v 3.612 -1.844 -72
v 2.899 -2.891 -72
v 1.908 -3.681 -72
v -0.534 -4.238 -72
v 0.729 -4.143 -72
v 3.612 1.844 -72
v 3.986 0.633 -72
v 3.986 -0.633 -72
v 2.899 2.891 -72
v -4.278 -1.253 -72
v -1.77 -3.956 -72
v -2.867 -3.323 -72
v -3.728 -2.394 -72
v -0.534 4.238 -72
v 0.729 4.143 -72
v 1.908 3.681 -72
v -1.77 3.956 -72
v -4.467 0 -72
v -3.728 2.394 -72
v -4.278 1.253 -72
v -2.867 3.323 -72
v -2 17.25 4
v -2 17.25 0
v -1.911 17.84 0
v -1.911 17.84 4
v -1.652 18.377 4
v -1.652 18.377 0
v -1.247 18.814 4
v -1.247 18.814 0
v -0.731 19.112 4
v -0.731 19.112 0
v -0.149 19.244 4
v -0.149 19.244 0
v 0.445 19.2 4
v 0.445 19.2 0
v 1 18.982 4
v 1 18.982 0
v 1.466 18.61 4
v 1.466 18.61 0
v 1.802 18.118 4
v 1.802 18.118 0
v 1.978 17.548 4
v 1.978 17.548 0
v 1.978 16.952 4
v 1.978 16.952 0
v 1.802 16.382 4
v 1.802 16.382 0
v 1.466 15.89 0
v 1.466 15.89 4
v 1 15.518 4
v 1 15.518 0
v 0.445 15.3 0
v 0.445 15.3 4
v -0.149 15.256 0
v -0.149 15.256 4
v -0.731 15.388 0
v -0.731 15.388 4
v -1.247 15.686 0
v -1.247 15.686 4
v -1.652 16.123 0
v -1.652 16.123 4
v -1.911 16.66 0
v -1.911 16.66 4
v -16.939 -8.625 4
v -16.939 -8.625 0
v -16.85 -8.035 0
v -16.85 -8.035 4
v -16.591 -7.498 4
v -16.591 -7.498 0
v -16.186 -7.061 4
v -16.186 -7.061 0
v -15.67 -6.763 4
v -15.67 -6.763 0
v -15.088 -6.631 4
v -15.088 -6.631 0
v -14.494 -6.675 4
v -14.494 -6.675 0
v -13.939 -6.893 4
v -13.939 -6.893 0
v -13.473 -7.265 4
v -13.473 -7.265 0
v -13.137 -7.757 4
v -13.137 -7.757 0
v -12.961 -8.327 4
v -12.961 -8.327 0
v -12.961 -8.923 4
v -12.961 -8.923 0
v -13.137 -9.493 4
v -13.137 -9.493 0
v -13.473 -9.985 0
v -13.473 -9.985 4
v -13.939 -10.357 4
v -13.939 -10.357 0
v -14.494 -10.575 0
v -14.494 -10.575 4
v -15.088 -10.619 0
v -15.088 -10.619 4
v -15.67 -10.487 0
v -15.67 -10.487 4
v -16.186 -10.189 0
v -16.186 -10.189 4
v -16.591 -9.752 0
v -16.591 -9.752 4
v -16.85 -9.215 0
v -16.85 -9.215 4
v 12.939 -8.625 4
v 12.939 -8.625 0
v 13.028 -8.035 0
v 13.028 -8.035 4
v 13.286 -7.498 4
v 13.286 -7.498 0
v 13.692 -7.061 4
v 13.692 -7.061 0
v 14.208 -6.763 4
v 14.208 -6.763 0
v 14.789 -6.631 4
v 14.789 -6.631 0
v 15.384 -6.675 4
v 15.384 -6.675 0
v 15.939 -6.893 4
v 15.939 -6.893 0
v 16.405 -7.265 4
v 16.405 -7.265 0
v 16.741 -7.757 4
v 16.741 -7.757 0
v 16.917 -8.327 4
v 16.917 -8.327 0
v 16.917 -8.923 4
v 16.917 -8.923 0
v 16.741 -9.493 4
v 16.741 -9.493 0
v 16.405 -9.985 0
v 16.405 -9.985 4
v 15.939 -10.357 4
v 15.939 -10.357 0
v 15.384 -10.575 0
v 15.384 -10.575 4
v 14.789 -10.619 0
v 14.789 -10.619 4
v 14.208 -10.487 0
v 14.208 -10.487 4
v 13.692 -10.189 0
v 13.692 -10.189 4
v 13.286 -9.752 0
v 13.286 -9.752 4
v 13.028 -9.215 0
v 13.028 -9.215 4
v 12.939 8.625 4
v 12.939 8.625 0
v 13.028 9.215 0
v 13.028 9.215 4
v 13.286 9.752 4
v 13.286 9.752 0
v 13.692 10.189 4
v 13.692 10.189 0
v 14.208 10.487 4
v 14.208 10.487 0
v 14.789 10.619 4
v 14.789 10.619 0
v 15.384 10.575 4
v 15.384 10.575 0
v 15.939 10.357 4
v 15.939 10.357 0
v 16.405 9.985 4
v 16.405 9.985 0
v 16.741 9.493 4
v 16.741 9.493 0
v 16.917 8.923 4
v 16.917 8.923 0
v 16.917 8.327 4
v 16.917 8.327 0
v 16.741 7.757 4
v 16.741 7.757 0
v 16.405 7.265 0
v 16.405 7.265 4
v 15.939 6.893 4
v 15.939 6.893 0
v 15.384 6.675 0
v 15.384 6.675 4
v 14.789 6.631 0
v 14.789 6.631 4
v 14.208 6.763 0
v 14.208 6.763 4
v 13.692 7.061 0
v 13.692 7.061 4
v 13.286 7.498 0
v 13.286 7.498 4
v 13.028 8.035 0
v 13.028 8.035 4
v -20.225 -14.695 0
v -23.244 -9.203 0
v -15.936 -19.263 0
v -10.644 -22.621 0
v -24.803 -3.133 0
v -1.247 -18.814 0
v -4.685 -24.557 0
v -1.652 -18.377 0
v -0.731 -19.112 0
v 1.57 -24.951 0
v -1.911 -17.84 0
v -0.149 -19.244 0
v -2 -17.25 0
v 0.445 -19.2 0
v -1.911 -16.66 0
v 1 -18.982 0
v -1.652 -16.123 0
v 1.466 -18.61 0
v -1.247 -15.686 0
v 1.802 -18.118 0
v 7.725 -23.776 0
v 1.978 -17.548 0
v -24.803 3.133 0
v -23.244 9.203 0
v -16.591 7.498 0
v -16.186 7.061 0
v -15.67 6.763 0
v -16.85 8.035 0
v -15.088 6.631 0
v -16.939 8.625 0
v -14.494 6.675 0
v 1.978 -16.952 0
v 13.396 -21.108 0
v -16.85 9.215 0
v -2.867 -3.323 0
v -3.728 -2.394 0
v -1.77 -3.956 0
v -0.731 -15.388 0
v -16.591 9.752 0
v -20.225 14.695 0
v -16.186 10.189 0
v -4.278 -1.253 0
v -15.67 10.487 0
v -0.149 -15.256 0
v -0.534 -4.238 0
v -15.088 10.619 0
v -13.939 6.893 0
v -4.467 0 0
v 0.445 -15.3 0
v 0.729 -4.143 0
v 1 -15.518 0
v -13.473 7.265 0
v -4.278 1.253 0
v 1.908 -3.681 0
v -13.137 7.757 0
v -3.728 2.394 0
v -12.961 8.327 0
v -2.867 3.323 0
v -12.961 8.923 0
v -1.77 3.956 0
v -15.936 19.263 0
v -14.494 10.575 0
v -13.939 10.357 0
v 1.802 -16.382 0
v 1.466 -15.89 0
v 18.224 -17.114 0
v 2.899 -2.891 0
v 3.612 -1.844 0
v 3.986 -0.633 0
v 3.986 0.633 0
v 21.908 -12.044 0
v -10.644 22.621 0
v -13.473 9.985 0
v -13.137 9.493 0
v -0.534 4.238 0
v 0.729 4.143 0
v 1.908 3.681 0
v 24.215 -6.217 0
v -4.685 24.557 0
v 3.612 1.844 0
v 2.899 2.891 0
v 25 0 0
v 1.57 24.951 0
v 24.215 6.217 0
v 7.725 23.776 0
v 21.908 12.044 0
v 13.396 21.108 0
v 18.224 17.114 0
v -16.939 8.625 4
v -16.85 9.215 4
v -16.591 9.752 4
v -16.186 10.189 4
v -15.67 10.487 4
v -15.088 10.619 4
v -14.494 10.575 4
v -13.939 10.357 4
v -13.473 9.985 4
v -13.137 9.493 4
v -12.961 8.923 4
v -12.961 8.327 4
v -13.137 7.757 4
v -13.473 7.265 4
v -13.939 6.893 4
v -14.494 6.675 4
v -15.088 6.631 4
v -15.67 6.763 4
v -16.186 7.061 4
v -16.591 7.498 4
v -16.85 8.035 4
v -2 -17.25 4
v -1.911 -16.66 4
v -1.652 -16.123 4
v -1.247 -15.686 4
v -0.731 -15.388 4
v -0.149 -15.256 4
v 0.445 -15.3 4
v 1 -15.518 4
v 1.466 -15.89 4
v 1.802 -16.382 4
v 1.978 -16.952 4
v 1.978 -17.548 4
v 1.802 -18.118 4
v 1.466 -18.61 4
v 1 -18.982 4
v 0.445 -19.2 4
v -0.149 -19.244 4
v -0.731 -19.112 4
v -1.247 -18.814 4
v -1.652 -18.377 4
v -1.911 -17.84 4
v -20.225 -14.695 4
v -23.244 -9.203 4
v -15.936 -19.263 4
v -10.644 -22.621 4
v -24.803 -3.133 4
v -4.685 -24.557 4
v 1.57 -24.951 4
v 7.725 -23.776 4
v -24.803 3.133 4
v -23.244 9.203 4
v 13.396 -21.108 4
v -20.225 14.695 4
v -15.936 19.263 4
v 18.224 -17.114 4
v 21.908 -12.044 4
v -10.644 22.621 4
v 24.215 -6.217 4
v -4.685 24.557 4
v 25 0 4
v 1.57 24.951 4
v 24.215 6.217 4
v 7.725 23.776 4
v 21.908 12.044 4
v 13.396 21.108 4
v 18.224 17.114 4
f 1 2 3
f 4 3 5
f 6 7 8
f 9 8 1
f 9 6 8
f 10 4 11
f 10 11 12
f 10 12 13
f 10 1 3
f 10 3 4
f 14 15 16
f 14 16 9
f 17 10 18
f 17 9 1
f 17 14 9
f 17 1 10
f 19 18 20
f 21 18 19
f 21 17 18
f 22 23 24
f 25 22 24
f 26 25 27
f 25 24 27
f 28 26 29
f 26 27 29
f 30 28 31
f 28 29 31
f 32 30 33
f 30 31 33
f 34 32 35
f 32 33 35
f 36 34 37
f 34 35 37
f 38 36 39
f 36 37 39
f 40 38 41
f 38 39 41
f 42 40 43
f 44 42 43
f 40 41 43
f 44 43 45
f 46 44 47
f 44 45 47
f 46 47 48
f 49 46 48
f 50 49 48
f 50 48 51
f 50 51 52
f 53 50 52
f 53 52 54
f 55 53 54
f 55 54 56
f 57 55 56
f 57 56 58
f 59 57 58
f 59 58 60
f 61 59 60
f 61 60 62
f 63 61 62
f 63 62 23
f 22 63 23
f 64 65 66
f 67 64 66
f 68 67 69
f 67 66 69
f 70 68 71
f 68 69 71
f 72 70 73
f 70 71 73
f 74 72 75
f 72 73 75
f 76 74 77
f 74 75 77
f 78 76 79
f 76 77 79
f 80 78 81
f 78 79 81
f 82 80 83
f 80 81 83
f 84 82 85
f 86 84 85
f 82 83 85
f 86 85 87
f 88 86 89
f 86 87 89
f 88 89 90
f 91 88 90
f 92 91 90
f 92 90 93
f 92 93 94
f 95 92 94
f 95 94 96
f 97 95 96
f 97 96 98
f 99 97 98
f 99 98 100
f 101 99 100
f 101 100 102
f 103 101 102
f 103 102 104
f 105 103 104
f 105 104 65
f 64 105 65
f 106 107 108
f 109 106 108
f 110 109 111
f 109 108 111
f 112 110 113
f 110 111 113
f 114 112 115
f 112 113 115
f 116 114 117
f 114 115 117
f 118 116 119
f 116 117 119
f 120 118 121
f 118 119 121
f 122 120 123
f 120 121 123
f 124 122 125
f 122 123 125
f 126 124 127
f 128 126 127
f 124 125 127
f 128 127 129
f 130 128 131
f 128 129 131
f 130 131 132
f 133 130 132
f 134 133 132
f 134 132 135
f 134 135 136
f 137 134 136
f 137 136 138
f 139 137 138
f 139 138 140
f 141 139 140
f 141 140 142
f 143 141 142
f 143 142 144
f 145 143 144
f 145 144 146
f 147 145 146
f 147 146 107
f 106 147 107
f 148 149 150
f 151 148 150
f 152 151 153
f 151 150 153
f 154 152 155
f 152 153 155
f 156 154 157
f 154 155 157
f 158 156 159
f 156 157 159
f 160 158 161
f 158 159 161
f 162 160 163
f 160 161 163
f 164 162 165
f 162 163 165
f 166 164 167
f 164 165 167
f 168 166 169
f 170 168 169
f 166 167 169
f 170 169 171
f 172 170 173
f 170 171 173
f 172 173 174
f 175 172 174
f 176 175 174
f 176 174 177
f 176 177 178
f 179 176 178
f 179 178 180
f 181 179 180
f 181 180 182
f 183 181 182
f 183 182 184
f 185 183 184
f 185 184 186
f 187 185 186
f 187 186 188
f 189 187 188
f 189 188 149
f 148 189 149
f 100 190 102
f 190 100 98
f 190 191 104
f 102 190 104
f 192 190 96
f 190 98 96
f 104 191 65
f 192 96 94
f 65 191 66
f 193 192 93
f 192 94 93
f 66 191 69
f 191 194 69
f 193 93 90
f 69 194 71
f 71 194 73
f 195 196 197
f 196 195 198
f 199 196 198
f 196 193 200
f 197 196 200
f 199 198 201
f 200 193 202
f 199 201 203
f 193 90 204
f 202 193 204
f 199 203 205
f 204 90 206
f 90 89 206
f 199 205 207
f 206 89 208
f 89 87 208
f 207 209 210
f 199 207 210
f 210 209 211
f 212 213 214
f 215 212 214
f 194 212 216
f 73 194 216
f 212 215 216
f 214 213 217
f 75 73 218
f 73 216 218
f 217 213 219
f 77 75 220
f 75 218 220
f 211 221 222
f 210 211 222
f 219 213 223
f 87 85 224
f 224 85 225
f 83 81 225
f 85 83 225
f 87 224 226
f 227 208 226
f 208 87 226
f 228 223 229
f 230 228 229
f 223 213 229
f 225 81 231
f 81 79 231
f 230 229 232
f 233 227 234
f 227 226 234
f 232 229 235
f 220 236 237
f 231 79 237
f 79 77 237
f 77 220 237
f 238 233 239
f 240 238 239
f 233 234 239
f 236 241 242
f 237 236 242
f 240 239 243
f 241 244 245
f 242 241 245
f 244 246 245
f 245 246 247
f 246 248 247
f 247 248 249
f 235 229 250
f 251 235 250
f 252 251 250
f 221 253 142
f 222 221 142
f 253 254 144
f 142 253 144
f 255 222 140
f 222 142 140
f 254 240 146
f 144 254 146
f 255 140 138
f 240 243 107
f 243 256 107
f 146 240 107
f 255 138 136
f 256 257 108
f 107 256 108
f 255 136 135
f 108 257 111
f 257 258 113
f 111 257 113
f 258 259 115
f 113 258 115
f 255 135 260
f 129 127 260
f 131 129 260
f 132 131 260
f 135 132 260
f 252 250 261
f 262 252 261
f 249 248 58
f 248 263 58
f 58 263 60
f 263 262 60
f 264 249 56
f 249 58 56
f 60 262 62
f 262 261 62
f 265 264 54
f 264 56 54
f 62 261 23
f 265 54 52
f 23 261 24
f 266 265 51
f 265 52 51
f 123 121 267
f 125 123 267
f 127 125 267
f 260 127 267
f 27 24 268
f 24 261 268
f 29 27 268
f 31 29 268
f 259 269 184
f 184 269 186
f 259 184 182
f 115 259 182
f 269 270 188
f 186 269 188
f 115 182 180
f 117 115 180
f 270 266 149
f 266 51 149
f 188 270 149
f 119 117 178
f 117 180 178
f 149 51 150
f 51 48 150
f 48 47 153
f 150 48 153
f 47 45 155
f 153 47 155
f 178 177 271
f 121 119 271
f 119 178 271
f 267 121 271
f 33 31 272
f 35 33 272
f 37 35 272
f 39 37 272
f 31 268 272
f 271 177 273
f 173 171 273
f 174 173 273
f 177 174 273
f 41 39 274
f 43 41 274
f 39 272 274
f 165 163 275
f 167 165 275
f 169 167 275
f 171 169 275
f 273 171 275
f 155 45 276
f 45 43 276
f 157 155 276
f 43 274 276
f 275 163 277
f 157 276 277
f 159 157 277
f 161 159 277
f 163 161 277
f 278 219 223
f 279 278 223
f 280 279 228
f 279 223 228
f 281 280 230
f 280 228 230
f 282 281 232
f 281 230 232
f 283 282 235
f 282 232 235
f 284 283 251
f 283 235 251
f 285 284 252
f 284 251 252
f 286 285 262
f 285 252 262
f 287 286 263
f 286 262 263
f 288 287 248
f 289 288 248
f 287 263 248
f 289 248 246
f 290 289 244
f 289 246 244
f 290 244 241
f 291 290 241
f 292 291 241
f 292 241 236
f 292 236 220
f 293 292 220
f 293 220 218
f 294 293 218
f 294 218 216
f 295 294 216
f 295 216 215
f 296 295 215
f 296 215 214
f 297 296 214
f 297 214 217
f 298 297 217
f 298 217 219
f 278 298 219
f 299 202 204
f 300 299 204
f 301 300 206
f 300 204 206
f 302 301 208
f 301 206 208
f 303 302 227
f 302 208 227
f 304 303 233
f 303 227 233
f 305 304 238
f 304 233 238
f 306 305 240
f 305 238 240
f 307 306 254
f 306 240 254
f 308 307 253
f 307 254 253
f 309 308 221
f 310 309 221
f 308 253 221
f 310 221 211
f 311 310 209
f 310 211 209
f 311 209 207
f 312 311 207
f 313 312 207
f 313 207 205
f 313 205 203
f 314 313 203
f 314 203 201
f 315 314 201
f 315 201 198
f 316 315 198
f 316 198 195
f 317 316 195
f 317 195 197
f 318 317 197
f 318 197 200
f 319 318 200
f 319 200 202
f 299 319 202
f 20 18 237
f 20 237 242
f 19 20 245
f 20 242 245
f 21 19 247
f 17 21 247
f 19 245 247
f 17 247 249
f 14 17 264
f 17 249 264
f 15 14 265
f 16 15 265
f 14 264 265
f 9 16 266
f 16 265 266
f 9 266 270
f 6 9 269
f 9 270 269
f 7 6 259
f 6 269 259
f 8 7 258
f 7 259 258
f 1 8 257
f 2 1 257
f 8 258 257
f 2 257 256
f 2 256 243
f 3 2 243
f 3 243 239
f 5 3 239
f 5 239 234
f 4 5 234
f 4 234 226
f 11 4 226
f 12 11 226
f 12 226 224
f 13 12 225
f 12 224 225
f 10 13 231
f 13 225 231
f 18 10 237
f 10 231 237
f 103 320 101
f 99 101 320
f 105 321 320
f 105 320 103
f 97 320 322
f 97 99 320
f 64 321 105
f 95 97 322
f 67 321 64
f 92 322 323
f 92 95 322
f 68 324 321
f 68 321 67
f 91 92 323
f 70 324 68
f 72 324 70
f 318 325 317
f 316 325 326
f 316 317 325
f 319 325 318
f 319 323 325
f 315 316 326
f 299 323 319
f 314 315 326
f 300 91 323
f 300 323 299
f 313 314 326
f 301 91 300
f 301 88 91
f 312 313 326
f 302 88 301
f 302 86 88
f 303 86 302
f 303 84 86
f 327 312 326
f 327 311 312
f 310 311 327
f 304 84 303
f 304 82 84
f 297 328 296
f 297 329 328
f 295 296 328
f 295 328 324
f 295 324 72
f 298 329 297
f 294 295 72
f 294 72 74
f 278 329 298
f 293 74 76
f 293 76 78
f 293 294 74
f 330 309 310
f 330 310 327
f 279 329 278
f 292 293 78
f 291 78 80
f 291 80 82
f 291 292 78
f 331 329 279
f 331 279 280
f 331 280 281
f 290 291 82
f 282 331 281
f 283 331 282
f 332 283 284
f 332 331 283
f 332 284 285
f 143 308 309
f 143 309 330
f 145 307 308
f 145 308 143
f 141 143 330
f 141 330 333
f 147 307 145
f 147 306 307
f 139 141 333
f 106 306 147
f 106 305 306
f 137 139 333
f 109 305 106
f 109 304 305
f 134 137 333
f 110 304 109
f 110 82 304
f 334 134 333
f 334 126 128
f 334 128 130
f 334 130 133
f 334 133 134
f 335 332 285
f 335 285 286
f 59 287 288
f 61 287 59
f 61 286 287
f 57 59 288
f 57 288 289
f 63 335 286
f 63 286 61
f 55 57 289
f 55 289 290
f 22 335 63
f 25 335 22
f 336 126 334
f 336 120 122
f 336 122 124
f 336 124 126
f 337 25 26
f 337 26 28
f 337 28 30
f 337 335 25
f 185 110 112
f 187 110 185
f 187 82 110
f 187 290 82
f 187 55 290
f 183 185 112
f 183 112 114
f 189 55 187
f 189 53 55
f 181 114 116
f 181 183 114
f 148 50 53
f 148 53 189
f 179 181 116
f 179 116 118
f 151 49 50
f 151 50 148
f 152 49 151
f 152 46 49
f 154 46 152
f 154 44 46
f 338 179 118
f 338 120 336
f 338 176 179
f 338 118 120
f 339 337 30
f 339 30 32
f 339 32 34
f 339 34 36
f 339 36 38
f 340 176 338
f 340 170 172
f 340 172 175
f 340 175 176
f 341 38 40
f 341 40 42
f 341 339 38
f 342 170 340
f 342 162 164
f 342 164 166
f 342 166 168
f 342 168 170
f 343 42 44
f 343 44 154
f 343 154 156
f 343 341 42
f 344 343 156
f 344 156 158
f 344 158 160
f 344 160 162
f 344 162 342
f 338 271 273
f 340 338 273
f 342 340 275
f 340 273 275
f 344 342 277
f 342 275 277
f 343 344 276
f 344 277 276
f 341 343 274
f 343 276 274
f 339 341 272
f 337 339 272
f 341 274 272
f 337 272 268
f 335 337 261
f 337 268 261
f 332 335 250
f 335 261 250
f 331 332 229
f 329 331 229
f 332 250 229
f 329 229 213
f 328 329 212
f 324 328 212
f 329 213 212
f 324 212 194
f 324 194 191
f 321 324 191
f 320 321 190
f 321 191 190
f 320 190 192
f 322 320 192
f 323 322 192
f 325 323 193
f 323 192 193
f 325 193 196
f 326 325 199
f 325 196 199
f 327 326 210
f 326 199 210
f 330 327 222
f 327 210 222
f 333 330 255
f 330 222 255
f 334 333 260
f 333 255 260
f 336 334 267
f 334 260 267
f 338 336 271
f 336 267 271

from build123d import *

# Parameters (mm, degrees)
SKETCH_1_R          = 25
EXTRUDE_1_DEPTH     = 4
SKETCH_2_R          = 4.25
EXTRUDE_2_DEPTH     = 72
SKETCH_3_R          = 2
CUT_EXTRUDE_1_DEPTH = 100


with BuildPart() as part:
    # 草图1 → 凸台-拉伸1 (new body)
    with BuildSketch(Plane.XY):
        Circle(SKETCH_1_R)
    extrude(amount=EXTRUDE_1_DEPTH)

    # 草图2 → 凸台-拉伸2 (add)
    with BuildSketch(Plane(origin=(0, 0, 0), x_dir=(-1, 0, 0), z_dir=(0, 0, -1))):
        with Locations((0.21687177, 0)):
            Circle(SKETCH_2_R)
    extrude(amount=EXTRUDE_2_DEPTH)

    # 草图3 → 切除-拉伸1 (cut)
    with BuildSketch(Plane(origin=(0, 0, 0), x_dir=(-1, 0, 0), z_dir=(0, 0, -1))):
        with Locations((0, 17.25)):
            Circle(SKETCH_3_R)
        with Locations((14.938938215, 8.625)):
            Circle(SKETCH_3_R)
        with Locations((14.938938215, -8.625)):
            Circle(SKETCH_3_R)
        with Locations((0, -17.25)):
            Circle(SKETCH_3_R)
        with Locations((-14.938938215, -8.625)):
            Circle(SKETCH_3_R)
        with Locations((-14.938938215, 8.625)):
            Circle(SKETCH_3_R)
    extrude(amount=-CUT_EXTRUDE_1_DEPTH, mode=Mode.SUBTRACT)


solid = part.part
